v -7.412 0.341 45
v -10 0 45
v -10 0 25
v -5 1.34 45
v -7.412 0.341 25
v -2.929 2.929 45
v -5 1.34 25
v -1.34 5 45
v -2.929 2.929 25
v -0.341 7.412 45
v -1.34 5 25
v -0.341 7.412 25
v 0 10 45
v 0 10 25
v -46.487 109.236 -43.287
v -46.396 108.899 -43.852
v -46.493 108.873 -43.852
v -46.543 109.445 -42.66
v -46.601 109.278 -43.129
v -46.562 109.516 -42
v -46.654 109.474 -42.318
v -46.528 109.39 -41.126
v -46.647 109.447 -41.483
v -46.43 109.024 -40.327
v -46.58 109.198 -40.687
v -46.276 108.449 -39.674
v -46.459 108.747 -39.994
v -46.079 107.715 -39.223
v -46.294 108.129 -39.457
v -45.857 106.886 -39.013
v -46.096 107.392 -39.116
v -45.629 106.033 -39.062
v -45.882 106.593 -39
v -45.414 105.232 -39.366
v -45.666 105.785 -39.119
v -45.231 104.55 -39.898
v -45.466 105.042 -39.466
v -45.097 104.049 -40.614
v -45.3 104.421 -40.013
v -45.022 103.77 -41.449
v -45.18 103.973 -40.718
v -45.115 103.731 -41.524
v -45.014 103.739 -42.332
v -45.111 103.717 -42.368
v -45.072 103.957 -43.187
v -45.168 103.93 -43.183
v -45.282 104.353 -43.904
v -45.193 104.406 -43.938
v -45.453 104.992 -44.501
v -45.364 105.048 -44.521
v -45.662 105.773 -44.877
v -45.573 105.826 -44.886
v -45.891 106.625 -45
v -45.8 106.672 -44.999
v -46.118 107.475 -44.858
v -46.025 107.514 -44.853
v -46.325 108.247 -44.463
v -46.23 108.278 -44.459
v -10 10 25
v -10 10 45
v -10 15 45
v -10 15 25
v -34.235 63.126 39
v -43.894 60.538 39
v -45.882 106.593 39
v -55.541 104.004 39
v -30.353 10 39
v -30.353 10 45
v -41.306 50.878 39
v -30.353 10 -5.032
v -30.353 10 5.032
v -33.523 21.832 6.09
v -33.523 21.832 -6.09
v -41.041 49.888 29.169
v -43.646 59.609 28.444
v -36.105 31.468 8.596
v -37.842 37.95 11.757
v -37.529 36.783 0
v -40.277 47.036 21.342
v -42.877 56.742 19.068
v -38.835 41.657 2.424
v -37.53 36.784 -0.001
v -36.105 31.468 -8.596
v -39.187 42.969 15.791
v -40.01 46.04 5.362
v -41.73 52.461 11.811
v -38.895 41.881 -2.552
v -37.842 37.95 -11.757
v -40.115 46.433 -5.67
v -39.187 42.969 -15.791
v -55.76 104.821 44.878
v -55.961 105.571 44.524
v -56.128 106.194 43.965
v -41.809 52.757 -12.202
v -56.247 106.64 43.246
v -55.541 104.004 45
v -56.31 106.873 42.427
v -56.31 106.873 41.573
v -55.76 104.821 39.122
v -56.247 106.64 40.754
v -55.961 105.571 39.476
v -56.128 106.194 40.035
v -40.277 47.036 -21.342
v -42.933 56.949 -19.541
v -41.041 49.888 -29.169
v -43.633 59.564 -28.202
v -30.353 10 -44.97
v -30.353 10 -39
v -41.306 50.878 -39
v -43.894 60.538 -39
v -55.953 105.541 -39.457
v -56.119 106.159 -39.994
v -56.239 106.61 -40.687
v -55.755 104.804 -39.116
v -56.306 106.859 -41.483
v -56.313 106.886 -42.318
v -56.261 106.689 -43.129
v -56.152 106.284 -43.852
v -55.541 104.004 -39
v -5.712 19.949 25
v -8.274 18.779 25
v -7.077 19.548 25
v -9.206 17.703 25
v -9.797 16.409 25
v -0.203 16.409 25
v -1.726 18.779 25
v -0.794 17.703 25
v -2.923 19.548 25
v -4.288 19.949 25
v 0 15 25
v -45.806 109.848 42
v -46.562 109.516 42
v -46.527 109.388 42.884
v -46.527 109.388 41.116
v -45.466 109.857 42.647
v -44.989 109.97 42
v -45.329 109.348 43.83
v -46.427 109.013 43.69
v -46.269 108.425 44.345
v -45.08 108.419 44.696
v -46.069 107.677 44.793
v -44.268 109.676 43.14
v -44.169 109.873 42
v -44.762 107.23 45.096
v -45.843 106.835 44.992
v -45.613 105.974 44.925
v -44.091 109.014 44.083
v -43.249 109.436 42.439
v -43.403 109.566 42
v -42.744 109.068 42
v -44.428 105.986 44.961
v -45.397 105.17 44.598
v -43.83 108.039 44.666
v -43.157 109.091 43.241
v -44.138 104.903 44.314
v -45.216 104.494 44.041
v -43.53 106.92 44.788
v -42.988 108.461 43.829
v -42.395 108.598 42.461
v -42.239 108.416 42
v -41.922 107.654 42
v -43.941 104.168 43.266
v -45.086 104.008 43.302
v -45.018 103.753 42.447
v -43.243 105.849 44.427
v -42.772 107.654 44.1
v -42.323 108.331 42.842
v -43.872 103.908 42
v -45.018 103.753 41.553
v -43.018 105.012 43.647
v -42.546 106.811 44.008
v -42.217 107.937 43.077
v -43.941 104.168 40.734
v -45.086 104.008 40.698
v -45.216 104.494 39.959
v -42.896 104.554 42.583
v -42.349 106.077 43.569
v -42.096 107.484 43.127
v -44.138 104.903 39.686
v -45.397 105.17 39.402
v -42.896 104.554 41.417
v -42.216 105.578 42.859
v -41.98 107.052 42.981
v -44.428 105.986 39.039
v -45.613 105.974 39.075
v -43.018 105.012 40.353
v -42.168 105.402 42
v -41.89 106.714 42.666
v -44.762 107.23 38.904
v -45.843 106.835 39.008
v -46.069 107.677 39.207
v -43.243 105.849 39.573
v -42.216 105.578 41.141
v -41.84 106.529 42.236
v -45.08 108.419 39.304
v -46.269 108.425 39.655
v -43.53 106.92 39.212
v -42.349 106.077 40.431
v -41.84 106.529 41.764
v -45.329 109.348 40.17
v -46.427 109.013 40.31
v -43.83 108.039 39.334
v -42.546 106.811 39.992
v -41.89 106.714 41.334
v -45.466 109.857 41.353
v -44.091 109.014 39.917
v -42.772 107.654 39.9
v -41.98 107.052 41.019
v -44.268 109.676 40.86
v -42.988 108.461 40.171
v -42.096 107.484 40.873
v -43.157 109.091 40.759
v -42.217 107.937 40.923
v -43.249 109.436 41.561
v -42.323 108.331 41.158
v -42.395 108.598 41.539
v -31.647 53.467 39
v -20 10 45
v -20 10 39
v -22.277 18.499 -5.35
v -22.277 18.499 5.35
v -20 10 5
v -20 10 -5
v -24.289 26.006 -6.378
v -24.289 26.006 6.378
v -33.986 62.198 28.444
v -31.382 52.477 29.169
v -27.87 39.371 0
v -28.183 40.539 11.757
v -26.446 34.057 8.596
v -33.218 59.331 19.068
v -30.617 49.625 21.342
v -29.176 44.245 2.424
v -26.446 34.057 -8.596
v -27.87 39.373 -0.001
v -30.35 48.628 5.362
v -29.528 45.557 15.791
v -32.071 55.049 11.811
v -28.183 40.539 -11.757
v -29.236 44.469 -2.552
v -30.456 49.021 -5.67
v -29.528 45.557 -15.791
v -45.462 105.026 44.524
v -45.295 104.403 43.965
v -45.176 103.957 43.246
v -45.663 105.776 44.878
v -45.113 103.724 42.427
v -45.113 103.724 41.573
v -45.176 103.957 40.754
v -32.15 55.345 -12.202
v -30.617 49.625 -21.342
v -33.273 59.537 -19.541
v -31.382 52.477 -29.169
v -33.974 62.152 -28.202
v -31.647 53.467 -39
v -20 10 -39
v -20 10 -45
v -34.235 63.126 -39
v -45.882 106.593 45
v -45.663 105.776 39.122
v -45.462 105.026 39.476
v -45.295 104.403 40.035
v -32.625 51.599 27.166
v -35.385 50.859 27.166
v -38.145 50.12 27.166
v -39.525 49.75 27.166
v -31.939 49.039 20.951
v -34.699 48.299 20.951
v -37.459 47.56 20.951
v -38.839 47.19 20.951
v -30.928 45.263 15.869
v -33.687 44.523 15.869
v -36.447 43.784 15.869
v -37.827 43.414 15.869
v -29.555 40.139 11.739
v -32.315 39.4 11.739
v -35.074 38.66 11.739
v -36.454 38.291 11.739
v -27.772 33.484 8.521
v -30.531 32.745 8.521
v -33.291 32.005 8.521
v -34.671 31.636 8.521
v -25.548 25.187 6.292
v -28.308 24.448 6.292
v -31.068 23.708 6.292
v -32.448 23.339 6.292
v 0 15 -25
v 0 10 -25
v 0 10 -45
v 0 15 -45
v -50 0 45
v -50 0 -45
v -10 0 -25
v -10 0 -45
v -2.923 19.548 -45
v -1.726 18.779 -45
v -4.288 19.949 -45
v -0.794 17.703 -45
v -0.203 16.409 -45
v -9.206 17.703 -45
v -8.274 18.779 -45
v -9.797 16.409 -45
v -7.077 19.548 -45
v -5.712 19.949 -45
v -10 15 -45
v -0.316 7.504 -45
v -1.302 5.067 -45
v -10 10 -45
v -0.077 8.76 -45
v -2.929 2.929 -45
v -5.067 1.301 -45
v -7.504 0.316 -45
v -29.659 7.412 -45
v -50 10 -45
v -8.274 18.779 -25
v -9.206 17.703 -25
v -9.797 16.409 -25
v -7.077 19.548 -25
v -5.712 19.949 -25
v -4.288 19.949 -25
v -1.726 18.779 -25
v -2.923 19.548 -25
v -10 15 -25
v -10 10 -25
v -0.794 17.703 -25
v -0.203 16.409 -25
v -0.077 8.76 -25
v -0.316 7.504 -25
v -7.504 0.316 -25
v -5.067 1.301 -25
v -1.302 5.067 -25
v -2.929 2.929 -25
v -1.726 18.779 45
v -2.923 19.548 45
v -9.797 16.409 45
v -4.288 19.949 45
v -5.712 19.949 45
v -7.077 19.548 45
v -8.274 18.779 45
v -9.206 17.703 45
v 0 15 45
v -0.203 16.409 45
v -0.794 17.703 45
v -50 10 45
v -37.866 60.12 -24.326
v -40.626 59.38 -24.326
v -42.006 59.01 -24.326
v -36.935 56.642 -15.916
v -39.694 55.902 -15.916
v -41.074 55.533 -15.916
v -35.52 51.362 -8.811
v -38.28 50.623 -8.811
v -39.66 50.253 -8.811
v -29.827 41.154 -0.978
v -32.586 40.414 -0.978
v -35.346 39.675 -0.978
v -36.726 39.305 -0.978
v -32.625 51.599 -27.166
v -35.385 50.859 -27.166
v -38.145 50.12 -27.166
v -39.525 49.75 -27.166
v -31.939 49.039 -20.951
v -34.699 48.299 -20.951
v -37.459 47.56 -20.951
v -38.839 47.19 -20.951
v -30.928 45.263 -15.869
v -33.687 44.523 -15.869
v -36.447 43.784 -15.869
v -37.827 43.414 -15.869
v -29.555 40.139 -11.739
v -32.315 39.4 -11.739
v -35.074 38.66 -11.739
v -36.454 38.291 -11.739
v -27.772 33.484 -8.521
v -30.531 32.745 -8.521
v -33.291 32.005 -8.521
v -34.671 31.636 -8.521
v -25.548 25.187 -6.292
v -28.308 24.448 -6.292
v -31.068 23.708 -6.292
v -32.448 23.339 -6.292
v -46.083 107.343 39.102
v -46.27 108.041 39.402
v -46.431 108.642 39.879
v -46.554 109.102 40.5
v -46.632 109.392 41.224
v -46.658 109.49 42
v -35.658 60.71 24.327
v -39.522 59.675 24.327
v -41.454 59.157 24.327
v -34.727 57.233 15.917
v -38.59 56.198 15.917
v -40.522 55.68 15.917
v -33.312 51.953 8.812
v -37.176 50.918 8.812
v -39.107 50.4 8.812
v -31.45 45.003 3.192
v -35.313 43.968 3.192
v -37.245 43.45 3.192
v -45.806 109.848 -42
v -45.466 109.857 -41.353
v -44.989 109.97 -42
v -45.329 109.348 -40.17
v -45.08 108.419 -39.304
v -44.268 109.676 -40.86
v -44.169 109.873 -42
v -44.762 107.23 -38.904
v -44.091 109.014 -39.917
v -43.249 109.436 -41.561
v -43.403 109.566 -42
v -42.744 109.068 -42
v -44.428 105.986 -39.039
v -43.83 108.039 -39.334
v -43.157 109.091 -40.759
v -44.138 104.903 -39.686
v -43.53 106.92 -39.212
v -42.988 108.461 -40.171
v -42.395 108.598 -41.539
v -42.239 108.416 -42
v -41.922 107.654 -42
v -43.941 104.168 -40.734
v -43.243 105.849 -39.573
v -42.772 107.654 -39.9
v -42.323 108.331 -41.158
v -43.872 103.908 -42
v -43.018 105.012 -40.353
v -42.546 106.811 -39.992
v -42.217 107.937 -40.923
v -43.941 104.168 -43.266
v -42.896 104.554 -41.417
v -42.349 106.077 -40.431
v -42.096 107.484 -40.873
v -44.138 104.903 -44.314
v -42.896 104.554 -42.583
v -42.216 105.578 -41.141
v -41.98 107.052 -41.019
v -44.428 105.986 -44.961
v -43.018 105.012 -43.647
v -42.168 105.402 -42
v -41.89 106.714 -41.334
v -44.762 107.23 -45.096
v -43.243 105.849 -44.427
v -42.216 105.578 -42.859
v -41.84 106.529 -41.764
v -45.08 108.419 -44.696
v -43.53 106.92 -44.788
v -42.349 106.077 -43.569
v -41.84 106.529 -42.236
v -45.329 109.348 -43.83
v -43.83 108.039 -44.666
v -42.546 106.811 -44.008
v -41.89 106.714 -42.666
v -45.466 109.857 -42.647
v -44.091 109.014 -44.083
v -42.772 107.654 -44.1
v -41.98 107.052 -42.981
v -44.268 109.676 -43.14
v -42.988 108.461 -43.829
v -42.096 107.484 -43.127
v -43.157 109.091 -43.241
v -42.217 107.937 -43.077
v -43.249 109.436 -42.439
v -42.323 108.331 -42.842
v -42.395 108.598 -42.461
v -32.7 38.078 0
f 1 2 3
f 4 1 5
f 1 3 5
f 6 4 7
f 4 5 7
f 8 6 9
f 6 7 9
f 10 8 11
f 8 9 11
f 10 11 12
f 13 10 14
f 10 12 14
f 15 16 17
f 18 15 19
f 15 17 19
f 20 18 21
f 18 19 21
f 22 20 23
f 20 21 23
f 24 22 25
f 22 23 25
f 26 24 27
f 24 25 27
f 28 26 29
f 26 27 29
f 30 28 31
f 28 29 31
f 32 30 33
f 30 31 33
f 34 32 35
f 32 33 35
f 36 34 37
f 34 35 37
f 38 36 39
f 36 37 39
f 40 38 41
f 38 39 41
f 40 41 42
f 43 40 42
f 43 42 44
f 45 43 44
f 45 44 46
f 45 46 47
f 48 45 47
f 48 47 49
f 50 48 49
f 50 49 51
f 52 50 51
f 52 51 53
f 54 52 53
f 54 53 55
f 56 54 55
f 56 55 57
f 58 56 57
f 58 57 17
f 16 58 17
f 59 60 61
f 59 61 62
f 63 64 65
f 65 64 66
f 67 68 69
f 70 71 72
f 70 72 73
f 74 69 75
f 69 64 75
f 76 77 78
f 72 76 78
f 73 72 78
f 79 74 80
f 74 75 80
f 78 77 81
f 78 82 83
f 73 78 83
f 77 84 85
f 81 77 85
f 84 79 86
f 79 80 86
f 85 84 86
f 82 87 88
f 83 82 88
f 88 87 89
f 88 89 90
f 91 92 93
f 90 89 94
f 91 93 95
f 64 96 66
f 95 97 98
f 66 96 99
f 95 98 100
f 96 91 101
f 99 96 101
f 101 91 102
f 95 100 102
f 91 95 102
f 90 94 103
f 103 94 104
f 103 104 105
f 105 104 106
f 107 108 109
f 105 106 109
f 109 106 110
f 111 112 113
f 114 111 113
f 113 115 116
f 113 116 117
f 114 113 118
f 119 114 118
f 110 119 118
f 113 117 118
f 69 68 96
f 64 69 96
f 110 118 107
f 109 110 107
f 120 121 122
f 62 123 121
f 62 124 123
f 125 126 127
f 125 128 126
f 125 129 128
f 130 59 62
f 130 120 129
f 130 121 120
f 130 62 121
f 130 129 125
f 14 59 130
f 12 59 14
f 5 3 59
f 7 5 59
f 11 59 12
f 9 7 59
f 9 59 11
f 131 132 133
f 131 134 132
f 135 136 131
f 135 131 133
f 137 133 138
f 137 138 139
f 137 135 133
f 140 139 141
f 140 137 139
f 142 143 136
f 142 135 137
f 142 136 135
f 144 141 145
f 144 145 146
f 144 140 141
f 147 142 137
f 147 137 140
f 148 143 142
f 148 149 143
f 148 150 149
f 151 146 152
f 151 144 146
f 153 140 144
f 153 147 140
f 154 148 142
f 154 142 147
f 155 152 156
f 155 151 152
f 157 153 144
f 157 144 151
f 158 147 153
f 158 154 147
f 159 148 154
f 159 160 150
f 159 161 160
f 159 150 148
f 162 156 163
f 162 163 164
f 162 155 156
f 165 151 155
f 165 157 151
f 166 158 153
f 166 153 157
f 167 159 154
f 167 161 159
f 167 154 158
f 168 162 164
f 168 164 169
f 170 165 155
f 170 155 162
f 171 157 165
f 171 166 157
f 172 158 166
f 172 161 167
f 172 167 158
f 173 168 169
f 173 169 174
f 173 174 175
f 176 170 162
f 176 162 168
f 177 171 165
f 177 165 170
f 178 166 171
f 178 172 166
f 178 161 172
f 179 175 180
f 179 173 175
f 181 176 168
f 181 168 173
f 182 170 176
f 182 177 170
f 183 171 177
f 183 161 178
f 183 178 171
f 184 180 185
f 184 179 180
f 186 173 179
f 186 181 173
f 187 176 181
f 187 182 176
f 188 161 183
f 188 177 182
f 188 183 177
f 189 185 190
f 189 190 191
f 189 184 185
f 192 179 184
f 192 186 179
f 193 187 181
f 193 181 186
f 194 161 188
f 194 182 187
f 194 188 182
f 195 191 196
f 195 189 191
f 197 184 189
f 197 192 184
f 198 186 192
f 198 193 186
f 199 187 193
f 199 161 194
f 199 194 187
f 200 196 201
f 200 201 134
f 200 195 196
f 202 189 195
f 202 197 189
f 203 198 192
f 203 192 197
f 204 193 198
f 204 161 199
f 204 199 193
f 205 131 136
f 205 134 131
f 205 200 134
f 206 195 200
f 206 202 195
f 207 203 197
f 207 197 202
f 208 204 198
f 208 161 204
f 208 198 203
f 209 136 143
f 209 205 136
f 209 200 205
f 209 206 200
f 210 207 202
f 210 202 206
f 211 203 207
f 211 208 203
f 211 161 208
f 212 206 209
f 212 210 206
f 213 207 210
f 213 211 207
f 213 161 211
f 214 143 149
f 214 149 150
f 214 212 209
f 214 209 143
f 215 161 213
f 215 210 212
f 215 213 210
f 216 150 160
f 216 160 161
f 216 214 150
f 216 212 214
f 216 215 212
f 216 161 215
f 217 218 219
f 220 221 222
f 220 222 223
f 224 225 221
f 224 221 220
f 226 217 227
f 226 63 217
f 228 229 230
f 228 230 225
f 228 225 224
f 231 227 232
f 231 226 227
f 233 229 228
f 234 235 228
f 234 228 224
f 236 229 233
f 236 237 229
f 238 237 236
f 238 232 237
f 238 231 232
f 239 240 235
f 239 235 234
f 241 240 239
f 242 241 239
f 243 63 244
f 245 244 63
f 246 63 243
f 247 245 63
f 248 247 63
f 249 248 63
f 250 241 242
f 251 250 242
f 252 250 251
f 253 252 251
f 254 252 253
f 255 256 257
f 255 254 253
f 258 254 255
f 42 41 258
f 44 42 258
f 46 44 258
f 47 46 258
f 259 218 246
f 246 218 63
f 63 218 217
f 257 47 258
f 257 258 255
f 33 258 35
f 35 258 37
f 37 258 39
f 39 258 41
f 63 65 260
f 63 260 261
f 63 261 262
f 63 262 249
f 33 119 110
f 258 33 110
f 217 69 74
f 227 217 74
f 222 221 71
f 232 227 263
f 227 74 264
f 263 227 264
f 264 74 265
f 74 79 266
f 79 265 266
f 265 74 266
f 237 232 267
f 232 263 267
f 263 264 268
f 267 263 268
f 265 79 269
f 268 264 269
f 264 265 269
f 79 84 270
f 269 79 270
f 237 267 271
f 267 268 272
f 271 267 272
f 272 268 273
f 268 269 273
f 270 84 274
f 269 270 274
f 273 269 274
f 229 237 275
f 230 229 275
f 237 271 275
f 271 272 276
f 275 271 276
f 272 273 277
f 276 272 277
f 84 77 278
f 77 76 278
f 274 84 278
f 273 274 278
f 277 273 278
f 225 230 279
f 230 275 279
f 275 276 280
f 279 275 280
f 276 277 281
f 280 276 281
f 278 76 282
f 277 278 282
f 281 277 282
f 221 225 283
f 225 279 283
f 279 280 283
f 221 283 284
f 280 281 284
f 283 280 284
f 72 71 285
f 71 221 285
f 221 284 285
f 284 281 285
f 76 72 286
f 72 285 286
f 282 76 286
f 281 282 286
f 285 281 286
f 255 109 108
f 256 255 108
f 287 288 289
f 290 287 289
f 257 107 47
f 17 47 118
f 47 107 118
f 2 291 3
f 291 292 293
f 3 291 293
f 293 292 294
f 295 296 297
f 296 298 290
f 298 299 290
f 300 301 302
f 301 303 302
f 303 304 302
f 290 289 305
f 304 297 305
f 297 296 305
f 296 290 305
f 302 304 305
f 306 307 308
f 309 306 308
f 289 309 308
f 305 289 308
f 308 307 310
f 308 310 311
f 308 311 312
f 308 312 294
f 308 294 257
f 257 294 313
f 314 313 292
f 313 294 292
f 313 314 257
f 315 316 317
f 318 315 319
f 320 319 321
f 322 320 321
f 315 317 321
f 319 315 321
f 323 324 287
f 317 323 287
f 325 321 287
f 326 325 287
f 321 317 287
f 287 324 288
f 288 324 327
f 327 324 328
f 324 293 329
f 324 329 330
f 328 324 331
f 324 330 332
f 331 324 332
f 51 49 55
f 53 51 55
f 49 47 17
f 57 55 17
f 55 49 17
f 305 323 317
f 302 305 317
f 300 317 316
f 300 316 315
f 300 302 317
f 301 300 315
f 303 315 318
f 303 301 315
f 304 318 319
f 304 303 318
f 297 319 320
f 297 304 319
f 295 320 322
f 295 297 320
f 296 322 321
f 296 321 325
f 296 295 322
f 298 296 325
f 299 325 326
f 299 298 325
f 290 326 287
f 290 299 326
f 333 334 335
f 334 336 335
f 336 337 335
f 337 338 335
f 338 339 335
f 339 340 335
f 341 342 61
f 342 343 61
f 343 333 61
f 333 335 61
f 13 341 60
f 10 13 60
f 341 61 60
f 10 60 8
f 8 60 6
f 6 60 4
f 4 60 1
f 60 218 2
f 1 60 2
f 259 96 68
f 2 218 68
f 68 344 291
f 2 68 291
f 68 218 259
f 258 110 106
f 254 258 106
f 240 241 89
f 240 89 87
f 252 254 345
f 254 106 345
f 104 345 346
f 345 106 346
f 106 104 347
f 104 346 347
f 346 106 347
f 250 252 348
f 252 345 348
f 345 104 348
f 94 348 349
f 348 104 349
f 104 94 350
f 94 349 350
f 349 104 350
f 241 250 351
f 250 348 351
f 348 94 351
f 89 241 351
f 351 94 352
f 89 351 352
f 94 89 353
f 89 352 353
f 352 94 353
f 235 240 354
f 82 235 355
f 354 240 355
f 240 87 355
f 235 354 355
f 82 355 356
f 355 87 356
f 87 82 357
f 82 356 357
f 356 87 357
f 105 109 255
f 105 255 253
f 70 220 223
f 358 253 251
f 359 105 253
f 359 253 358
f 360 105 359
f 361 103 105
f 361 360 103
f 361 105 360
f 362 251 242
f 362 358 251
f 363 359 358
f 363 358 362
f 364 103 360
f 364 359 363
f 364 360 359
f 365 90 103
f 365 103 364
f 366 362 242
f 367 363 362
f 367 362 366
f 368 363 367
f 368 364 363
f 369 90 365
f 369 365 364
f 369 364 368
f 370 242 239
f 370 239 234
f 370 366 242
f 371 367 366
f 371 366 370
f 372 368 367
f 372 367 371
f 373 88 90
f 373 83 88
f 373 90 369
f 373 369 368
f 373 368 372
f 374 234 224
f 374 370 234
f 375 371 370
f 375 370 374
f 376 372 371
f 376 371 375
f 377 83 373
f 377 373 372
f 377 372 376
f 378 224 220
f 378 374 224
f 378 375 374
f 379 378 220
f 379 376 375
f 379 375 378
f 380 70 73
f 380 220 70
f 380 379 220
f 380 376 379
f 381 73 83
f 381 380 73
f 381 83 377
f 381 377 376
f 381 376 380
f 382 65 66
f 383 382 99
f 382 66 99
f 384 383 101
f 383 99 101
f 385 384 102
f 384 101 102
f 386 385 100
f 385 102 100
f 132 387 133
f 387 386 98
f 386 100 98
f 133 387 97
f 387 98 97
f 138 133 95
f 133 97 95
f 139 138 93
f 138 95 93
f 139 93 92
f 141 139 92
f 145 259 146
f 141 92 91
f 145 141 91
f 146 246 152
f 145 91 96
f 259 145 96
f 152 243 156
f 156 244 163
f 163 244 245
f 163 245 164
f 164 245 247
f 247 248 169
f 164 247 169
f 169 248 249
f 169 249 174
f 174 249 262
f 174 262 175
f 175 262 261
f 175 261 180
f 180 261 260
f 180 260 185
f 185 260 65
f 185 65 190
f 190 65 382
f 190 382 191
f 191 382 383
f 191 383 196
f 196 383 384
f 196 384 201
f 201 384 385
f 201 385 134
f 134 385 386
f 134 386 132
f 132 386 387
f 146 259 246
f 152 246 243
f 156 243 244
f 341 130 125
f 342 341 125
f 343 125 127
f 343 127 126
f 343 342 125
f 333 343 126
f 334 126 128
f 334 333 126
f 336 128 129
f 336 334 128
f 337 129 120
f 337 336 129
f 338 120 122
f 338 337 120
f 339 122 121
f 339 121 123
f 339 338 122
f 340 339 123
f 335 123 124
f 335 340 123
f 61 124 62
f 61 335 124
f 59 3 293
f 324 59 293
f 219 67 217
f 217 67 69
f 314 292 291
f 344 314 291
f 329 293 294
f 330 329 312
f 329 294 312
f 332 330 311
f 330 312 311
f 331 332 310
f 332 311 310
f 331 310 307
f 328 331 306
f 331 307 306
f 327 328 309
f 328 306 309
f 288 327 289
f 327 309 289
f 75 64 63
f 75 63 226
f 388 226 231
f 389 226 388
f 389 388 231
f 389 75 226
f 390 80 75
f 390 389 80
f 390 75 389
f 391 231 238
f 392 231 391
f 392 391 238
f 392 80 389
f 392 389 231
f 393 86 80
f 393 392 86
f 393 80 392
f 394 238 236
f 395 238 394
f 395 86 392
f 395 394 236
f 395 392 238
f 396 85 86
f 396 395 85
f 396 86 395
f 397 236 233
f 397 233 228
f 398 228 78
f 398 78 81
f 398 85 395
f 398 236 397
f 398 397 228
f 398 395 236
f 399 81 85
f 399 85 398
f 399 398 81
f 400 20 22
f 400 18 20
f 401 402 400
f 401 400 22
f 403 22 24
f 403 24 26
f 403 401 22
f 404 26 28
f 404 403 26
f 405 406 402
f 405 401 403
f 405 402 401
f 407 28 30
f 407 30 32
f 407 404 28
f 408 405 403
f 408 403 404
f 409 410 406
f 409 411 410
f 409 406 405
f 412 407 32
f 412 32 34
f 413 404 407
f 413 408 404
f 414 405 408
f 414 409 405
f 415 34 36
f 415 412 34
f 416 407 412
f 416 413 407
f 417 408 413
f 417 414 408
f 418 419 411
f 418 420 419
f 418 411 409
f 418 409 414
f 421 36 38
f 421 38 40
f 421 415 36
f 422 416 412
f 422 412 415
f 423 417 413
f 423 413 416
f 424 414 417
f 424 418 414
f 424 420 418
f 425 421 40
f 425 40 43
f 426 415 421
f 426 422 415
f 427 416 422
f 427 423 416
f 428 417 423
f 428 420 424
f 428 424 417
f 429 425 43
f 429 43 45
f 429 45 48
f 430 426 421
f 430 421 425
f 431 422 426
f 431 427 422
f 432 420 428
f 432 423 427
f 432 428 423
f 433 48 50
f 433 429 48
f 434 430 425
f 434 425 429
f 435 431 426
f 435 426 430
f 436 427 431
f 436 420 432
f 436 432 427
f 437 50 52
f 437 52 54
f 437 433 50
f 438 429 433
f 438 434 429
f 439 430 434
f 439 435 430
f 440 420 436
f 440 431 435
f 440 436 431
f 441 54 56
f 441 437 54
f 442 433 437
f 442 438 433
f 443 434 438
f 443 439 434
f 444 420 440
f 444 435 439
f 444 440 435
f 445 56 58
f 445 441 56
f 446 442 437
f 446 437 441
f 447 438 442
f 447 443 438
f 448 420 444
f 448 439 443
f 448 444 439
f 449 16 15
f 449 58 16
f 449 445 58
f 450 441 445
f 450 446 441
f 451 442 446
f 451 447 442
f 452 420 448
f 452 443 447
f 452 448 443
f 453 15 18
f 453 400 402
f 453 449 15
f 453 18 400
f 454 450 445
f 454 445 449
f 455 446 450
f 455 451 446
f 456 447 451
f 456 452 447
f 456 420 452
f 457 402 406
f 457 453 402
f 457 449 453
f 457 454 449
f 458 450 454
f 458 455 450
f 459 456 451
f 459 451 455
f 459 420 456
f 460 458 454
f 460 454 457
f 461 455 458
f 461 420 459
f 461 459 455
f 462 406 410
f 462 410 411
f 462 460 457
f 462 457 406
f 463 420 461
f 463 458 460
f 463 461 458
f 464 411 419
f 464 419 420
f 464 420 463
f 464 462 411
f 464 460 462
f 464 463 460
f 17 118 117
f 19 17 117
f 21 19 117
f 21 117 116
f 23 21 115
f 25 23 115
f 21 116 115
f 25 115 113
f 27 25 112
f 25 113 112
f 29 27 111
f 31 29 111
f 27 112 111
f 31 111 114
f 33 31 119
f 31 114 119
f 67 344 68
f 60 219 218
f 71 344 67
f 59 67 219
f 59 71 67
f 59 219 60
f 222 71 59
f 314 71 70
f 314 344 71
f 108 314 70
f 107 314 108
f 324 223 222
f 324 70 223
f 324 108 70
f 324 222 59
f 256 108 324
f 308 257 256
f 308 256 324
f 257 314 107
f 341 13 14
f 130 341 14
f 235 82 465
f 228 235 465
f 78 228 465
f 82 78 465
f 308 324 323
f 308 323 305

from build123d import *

# Parameters (mm, degrees)
BOSS_EXTRUDE1_DEPTH = 10
SKETCH2_3_W         = 10
SKETCH2_3_H         = 20
BOSS_EXTRUDE2_DEPTH = 20
BOSS_EXTRUDE3_START = -10
BOSS_EXTRUDE3_DEPTH = 10
SKETCH8_R           = 3
BOSS_EXTRUDE5_DEPTH = 0.1
DOME2_FACE_RADIUS   = 3
DOME2_HEIGHT        = 4
DOME3_FACE_RADIUS   = 3
DOME3_HEIGHT        = 4
FILLET1_RADIUS      = 5
FILLET1_LENGTH      = 20
FILLET2_RADIUS      = 5
FILLET2_LENGTH      = 20
FILLET3_R           = 10
FILLET4_R           = 10


# Read off the part's stored shape, not the designer's step: Boss-Extrude3
with BuildPart() as part:
    # Sketch2 → Boss-Extrude1 (new body)
    with BuildSketch(Plane(origin=(0, 0, 0), x_dir=(1, 0, 0), z_dir=(0, 1, 0))):
        Polygon((-10, 45), (-50, 45), (-50, -45), (-10, -45), (-10, -25), (-10, 25), align=None)
    extrude(amount=BOSS_EXTRUDE1_DEPTH)

    # Sketch2<3> → Boss-Extrude2 (add)
    with BuildSketch(Plane(origin=(0, 0, 0), x_dir=(1, 0, 0), z_dir=(0, 1, 0))):
        with Locations((-5, -35)):
            Rectangle(SKETCH2_3_W, SKETCH2_3_H)
        with Locations((-5, 35)):
            Rectangle(SKETCH2_3_W, SKETCH2_3_H)
    extrude(amount=BOSS_EXTRUDE2_DEPTH)

    # Boss-Extrude3 outline → Boss-Extrude3 (add)
    with BuildSketch(Plane(origin=(-16.160254038, -4.330127019, 0), x_dir=(0, 0, -1), z_dir=(0.9659258262890681, 0.25881904510252135, 0)).offset(BOSS_EXTRUDE3_START)):
        with BuildLine():
            Line((-45, 114.835639165), (-45, 14.835639165))
            Line((-45, 14.835639165), (-39, 14.835639165))
            Line((-39, 14.835639165), (-39, 59.835639165))
            Line((-39, 59.835639165), (-39, 69.835639165))
            Line((-39, 69.835639165), (-39, 114.835639165))
            ThreePointArc((-39, 114.835639165), (-42, 117.835639165), (-45, 114.835639165))
        make_face()
        with BuildLine():
            Line((-39, 69.835639165), (-39, 59.835639165))
            add(Edge.make_bspline(
                [(-39, 59.835639165), (-32.29466778, 59.812740608), (-23.746310881, 57.26615983), (-18.155959882, 54.002687415), (-13.581360263, 49.447869434), (-9.895970778, 43.393937355), (-7.1466079, 35.668544709), (-5.009950643, 23.851055873), (-5, 14.835639165)],
                knots=[0, 0, 0, 0.1875, 0.3125, 0.4375, 0.5625, 0.6875, 0.8125, 1, 1, 1], degree=2))
            Line((-5, 14.835639165), (5, 14.835639165))
            add(Edge.make_bspline(
                [(0.000646167, 45.244430902), (0.476875904, 44.083141287), (2.5762954, 38.143358621), (5.009950643, 24.570222457), (5, 14.835639165)],
                knots=[0.655563959, 0.655563959, 0.655563959, 0.6875, 0.8125, 1, 1, 1], degree=2))
            add(Edge.make_bspline(
                [(0.000646167, 45.244430902), (0.000323073, 45.243642557), (0, 45.24285419)],
                knots=[0.655550731, 0.655550731, 0.655550731, 0.655572405, 0.655572405, 0.655572405], degree=2))
            add(Edge.make_bspline(
                [(-39, 69.835639165), (-31.080450951, 69.858370058), (-19.824359781, 66.54538789), (-12.00867454, 61.996263654), (-5.614755257, 55.613542625), (-1.387837079, 48.627543749), (0, 45.24285419)],
                knots=[0, 0, 0, 0.1875, 0.3125, 0.4375, 0.5625, 0.655579399, 0.655579399, 0.655579399], degree=2))
        make_face()
        with BuildLine():
            add(Edge.make_bspline(
                [(39, 69.835639165), (36.362179487, 69.835639165), (28.828562218, 69.197832663), (19.824098622, 66.545415855), (12.008024479, 61.996828001), (5.61432407, 55.613689023), (1.991176128, 49.630689625), (0.466161192, 46.380278102), (0.000646167, 45.244430902)],
                knots=[0, 0, 0, 0.0625, 0.1875, 0.3125, 0.4375, 0.5625, 0.624322405, 0.655550731, 0.655550731, 0.655550731], degree=2))
            add(Edge.make_bspline(
                [(0.000646167, 45.244430902), (0.476875904, 44.083141287), (2.5762954, 38.143358621), (5.009950643, 24.570222457), (5, 14.835639165)],
                knots=[0.655563959, 0.655563959, 0.655563959, 0.6875, 0.8125, 1, 1, 1], degree=2))
            add(Edge.make_bspline(
                [(39, 59.835639165), (32.29466778, 59.812740608), (23.746310881, 57.26615983), (18.155959882, 54.002687415), (13.581360263, 49.447869434), (9.895970778, 43.393937355), (7.1466079, 35.668544709), (5.009950643, 23.851055873), (5, 14.835639165)],
                knots=[0, 0, 0, 0.1875, 0.3125, 0.4375, 0.5625, 0.6875, 0.8125, 1, 1, 1], degree=2))
            Line((39, 59.835639165), (39, 69.835639165))
        make_face()
        with BuildLine():
            Line((39, 114.835639165), (39, 69.835639165))
            Line((39, 69.835639165), (39, 59.835639165))
            Line((39, 59.835639165), (39, 14.835639165))
            Line((39, 14.835639165), (45, 14.835639165))
            Line((45, 14.835639165), (43.851535226, 117.196108886))
            ThreePointArc((43.851535226, 117.196108886), (40.687484415, 117.533286814), (39, 114.835639165))
        make_face()
    extrude(amount=BOSS_EXTRUDE3_DEPTH)

    # Sketch8 → Boss-Extrude5 (add)
    with BuildSketch(Plane(origin=(-16.160254038, -4.330127019, 0), x_dir=(0, 0, -1), z_dir=(0.9659258262890682, 0.2588190451025214, 0))):
        with Locations(Location((-42, 114.835639165, 0), (0, 0, 90))):
            Circle(SKETCH8_R)
        with Locations(Location((42, 114.835639165, 0), (0, 0, 51.889621563))):
            Circle(SKETCH8_R)
    extrude(amount=BOSS_EXTRUDE5_DEPTH)

    # Dome2: a dome of height H over a round flat face of radius A is a cap of a sphere of radius (A * A + H * H) / (2 * H)
    dome2_r = (DOME2_FACE_RADIUS * DOME2_FACE_RADIUS + DOME2_HEIGHT * DOME2_HEIGHT) / (2 * DOME2_HEIGHT)
    dome2_base = Plane((-45.785311928, 106.618464533, 42), z_dir=(0.965925826289, 0.258819045103, 0))
    with Locations(dome2_base.offset(DOME2_HEIGHT - dome2_r)):
        dome2_ball = Sphere(dome2_r, mode=Mode.PRIVATE)
    add(split(dome2_ball, bisect_by=dome2_base, keep=Keep.TOP, mode=Mode.PRIVATE))

    # Dome3: a dome of height H over a round flat face of radius A is a cap of a sphere of radius (A * A + H * H) / (2 * H)
    dome3_r = (DOME3_FACE_RADIUS * DOME3_FACE_RADIUS + DOME3_HEIGHT * DOME3_HEIGHT) / (2 * DOME3_HEIGHT)
    dome3_base = Plane((-45.785311928, 106.618464533, -42), z_dir=(0.965925826289, 0.258819045103, 0))
    with Locations(dome3_base.offset(DOME3_HEIGHT - dome3_r)):
        dome3_ball = Sphere(dome3_r, mode=Mode.PRIVATE)
    add(split(dome3_ball, bisect_by=dome3_base, keep=Keep.TOP, mode=Mode.PRIVATE))

    # Fillet1: full round fillet: the end face becomes a half cylinder, R = half its width
    fillet1_face = Plane((-5, 20, -35), x_dir=(0, 0, -1), z_dir=(0, 1, 0))  # on the end face: x along it, z out of the body
    fillet1_slab = fillet1_face.offset(-FILLET1_RADIUS / 2) * Box(FILLET1_LENGTH, 2 * FILLET1_RADIUS, FILLET1_RADIUS, mode=Mode.PRIVATE)  # the body's end, R deep
    fillet1_round = Plane((-5, 15, -35), x_dir=(0, 1, 0), z_dir=(0, 0, -1)) * Cylinder(FILLET1_RADIUS, FILLET1_LENGTH, mode=Mode.PRIVATE)  # its axis R under the face
    add(fillet1_slab - fillet1_round, mode=Mode.SUBTRACT)

    # Fillet2: full round fillet: the end face becomes a half cylinder, R = half its width
    fillet2_face = Plane((-5, 20, 35), x_dir=(0, 0, 1), z_dir=(0, 1, 0))  # on the end face: x along it, z out of the body
    fillet2_slab = fillet2_face.offset(-FILLET2_RADIUS / 2) * Box(FILLET2_LENGTH, 2 * FILLET2_RADIUS, FILLET2_RADIUS, mode=Mode.PRIVATE)  # the body's end, R deep
    fillet2_round = Plane((-5, 15, 35), x_dir=(0, 1, 0), z_dir=(0, 0, 1)) * Cylinder(FILLET2_RADIUS, FILLET2_LENGTH, mode=Mode.PRIVATE)  # its axis R under the face
    add(fillet2_slab - fillet2_round, mode=Mode.SUBTRACT)

    # Fillet3
    fillet3_edges = [part.edges().sort_by_distance(p)[0] for p in [
        (0, 0, 35),
    ]]
    fillet(fillet3_edges, radius=FILLET3_R)

    # Fillet4
    fillet4_edges = [part.edges().sort_by_distance(p)[0] for p in [
        (0, 0, -35),
    ]]
    fillet(fillet4_edges, radius=FILLET4_R)


solid = part.part
